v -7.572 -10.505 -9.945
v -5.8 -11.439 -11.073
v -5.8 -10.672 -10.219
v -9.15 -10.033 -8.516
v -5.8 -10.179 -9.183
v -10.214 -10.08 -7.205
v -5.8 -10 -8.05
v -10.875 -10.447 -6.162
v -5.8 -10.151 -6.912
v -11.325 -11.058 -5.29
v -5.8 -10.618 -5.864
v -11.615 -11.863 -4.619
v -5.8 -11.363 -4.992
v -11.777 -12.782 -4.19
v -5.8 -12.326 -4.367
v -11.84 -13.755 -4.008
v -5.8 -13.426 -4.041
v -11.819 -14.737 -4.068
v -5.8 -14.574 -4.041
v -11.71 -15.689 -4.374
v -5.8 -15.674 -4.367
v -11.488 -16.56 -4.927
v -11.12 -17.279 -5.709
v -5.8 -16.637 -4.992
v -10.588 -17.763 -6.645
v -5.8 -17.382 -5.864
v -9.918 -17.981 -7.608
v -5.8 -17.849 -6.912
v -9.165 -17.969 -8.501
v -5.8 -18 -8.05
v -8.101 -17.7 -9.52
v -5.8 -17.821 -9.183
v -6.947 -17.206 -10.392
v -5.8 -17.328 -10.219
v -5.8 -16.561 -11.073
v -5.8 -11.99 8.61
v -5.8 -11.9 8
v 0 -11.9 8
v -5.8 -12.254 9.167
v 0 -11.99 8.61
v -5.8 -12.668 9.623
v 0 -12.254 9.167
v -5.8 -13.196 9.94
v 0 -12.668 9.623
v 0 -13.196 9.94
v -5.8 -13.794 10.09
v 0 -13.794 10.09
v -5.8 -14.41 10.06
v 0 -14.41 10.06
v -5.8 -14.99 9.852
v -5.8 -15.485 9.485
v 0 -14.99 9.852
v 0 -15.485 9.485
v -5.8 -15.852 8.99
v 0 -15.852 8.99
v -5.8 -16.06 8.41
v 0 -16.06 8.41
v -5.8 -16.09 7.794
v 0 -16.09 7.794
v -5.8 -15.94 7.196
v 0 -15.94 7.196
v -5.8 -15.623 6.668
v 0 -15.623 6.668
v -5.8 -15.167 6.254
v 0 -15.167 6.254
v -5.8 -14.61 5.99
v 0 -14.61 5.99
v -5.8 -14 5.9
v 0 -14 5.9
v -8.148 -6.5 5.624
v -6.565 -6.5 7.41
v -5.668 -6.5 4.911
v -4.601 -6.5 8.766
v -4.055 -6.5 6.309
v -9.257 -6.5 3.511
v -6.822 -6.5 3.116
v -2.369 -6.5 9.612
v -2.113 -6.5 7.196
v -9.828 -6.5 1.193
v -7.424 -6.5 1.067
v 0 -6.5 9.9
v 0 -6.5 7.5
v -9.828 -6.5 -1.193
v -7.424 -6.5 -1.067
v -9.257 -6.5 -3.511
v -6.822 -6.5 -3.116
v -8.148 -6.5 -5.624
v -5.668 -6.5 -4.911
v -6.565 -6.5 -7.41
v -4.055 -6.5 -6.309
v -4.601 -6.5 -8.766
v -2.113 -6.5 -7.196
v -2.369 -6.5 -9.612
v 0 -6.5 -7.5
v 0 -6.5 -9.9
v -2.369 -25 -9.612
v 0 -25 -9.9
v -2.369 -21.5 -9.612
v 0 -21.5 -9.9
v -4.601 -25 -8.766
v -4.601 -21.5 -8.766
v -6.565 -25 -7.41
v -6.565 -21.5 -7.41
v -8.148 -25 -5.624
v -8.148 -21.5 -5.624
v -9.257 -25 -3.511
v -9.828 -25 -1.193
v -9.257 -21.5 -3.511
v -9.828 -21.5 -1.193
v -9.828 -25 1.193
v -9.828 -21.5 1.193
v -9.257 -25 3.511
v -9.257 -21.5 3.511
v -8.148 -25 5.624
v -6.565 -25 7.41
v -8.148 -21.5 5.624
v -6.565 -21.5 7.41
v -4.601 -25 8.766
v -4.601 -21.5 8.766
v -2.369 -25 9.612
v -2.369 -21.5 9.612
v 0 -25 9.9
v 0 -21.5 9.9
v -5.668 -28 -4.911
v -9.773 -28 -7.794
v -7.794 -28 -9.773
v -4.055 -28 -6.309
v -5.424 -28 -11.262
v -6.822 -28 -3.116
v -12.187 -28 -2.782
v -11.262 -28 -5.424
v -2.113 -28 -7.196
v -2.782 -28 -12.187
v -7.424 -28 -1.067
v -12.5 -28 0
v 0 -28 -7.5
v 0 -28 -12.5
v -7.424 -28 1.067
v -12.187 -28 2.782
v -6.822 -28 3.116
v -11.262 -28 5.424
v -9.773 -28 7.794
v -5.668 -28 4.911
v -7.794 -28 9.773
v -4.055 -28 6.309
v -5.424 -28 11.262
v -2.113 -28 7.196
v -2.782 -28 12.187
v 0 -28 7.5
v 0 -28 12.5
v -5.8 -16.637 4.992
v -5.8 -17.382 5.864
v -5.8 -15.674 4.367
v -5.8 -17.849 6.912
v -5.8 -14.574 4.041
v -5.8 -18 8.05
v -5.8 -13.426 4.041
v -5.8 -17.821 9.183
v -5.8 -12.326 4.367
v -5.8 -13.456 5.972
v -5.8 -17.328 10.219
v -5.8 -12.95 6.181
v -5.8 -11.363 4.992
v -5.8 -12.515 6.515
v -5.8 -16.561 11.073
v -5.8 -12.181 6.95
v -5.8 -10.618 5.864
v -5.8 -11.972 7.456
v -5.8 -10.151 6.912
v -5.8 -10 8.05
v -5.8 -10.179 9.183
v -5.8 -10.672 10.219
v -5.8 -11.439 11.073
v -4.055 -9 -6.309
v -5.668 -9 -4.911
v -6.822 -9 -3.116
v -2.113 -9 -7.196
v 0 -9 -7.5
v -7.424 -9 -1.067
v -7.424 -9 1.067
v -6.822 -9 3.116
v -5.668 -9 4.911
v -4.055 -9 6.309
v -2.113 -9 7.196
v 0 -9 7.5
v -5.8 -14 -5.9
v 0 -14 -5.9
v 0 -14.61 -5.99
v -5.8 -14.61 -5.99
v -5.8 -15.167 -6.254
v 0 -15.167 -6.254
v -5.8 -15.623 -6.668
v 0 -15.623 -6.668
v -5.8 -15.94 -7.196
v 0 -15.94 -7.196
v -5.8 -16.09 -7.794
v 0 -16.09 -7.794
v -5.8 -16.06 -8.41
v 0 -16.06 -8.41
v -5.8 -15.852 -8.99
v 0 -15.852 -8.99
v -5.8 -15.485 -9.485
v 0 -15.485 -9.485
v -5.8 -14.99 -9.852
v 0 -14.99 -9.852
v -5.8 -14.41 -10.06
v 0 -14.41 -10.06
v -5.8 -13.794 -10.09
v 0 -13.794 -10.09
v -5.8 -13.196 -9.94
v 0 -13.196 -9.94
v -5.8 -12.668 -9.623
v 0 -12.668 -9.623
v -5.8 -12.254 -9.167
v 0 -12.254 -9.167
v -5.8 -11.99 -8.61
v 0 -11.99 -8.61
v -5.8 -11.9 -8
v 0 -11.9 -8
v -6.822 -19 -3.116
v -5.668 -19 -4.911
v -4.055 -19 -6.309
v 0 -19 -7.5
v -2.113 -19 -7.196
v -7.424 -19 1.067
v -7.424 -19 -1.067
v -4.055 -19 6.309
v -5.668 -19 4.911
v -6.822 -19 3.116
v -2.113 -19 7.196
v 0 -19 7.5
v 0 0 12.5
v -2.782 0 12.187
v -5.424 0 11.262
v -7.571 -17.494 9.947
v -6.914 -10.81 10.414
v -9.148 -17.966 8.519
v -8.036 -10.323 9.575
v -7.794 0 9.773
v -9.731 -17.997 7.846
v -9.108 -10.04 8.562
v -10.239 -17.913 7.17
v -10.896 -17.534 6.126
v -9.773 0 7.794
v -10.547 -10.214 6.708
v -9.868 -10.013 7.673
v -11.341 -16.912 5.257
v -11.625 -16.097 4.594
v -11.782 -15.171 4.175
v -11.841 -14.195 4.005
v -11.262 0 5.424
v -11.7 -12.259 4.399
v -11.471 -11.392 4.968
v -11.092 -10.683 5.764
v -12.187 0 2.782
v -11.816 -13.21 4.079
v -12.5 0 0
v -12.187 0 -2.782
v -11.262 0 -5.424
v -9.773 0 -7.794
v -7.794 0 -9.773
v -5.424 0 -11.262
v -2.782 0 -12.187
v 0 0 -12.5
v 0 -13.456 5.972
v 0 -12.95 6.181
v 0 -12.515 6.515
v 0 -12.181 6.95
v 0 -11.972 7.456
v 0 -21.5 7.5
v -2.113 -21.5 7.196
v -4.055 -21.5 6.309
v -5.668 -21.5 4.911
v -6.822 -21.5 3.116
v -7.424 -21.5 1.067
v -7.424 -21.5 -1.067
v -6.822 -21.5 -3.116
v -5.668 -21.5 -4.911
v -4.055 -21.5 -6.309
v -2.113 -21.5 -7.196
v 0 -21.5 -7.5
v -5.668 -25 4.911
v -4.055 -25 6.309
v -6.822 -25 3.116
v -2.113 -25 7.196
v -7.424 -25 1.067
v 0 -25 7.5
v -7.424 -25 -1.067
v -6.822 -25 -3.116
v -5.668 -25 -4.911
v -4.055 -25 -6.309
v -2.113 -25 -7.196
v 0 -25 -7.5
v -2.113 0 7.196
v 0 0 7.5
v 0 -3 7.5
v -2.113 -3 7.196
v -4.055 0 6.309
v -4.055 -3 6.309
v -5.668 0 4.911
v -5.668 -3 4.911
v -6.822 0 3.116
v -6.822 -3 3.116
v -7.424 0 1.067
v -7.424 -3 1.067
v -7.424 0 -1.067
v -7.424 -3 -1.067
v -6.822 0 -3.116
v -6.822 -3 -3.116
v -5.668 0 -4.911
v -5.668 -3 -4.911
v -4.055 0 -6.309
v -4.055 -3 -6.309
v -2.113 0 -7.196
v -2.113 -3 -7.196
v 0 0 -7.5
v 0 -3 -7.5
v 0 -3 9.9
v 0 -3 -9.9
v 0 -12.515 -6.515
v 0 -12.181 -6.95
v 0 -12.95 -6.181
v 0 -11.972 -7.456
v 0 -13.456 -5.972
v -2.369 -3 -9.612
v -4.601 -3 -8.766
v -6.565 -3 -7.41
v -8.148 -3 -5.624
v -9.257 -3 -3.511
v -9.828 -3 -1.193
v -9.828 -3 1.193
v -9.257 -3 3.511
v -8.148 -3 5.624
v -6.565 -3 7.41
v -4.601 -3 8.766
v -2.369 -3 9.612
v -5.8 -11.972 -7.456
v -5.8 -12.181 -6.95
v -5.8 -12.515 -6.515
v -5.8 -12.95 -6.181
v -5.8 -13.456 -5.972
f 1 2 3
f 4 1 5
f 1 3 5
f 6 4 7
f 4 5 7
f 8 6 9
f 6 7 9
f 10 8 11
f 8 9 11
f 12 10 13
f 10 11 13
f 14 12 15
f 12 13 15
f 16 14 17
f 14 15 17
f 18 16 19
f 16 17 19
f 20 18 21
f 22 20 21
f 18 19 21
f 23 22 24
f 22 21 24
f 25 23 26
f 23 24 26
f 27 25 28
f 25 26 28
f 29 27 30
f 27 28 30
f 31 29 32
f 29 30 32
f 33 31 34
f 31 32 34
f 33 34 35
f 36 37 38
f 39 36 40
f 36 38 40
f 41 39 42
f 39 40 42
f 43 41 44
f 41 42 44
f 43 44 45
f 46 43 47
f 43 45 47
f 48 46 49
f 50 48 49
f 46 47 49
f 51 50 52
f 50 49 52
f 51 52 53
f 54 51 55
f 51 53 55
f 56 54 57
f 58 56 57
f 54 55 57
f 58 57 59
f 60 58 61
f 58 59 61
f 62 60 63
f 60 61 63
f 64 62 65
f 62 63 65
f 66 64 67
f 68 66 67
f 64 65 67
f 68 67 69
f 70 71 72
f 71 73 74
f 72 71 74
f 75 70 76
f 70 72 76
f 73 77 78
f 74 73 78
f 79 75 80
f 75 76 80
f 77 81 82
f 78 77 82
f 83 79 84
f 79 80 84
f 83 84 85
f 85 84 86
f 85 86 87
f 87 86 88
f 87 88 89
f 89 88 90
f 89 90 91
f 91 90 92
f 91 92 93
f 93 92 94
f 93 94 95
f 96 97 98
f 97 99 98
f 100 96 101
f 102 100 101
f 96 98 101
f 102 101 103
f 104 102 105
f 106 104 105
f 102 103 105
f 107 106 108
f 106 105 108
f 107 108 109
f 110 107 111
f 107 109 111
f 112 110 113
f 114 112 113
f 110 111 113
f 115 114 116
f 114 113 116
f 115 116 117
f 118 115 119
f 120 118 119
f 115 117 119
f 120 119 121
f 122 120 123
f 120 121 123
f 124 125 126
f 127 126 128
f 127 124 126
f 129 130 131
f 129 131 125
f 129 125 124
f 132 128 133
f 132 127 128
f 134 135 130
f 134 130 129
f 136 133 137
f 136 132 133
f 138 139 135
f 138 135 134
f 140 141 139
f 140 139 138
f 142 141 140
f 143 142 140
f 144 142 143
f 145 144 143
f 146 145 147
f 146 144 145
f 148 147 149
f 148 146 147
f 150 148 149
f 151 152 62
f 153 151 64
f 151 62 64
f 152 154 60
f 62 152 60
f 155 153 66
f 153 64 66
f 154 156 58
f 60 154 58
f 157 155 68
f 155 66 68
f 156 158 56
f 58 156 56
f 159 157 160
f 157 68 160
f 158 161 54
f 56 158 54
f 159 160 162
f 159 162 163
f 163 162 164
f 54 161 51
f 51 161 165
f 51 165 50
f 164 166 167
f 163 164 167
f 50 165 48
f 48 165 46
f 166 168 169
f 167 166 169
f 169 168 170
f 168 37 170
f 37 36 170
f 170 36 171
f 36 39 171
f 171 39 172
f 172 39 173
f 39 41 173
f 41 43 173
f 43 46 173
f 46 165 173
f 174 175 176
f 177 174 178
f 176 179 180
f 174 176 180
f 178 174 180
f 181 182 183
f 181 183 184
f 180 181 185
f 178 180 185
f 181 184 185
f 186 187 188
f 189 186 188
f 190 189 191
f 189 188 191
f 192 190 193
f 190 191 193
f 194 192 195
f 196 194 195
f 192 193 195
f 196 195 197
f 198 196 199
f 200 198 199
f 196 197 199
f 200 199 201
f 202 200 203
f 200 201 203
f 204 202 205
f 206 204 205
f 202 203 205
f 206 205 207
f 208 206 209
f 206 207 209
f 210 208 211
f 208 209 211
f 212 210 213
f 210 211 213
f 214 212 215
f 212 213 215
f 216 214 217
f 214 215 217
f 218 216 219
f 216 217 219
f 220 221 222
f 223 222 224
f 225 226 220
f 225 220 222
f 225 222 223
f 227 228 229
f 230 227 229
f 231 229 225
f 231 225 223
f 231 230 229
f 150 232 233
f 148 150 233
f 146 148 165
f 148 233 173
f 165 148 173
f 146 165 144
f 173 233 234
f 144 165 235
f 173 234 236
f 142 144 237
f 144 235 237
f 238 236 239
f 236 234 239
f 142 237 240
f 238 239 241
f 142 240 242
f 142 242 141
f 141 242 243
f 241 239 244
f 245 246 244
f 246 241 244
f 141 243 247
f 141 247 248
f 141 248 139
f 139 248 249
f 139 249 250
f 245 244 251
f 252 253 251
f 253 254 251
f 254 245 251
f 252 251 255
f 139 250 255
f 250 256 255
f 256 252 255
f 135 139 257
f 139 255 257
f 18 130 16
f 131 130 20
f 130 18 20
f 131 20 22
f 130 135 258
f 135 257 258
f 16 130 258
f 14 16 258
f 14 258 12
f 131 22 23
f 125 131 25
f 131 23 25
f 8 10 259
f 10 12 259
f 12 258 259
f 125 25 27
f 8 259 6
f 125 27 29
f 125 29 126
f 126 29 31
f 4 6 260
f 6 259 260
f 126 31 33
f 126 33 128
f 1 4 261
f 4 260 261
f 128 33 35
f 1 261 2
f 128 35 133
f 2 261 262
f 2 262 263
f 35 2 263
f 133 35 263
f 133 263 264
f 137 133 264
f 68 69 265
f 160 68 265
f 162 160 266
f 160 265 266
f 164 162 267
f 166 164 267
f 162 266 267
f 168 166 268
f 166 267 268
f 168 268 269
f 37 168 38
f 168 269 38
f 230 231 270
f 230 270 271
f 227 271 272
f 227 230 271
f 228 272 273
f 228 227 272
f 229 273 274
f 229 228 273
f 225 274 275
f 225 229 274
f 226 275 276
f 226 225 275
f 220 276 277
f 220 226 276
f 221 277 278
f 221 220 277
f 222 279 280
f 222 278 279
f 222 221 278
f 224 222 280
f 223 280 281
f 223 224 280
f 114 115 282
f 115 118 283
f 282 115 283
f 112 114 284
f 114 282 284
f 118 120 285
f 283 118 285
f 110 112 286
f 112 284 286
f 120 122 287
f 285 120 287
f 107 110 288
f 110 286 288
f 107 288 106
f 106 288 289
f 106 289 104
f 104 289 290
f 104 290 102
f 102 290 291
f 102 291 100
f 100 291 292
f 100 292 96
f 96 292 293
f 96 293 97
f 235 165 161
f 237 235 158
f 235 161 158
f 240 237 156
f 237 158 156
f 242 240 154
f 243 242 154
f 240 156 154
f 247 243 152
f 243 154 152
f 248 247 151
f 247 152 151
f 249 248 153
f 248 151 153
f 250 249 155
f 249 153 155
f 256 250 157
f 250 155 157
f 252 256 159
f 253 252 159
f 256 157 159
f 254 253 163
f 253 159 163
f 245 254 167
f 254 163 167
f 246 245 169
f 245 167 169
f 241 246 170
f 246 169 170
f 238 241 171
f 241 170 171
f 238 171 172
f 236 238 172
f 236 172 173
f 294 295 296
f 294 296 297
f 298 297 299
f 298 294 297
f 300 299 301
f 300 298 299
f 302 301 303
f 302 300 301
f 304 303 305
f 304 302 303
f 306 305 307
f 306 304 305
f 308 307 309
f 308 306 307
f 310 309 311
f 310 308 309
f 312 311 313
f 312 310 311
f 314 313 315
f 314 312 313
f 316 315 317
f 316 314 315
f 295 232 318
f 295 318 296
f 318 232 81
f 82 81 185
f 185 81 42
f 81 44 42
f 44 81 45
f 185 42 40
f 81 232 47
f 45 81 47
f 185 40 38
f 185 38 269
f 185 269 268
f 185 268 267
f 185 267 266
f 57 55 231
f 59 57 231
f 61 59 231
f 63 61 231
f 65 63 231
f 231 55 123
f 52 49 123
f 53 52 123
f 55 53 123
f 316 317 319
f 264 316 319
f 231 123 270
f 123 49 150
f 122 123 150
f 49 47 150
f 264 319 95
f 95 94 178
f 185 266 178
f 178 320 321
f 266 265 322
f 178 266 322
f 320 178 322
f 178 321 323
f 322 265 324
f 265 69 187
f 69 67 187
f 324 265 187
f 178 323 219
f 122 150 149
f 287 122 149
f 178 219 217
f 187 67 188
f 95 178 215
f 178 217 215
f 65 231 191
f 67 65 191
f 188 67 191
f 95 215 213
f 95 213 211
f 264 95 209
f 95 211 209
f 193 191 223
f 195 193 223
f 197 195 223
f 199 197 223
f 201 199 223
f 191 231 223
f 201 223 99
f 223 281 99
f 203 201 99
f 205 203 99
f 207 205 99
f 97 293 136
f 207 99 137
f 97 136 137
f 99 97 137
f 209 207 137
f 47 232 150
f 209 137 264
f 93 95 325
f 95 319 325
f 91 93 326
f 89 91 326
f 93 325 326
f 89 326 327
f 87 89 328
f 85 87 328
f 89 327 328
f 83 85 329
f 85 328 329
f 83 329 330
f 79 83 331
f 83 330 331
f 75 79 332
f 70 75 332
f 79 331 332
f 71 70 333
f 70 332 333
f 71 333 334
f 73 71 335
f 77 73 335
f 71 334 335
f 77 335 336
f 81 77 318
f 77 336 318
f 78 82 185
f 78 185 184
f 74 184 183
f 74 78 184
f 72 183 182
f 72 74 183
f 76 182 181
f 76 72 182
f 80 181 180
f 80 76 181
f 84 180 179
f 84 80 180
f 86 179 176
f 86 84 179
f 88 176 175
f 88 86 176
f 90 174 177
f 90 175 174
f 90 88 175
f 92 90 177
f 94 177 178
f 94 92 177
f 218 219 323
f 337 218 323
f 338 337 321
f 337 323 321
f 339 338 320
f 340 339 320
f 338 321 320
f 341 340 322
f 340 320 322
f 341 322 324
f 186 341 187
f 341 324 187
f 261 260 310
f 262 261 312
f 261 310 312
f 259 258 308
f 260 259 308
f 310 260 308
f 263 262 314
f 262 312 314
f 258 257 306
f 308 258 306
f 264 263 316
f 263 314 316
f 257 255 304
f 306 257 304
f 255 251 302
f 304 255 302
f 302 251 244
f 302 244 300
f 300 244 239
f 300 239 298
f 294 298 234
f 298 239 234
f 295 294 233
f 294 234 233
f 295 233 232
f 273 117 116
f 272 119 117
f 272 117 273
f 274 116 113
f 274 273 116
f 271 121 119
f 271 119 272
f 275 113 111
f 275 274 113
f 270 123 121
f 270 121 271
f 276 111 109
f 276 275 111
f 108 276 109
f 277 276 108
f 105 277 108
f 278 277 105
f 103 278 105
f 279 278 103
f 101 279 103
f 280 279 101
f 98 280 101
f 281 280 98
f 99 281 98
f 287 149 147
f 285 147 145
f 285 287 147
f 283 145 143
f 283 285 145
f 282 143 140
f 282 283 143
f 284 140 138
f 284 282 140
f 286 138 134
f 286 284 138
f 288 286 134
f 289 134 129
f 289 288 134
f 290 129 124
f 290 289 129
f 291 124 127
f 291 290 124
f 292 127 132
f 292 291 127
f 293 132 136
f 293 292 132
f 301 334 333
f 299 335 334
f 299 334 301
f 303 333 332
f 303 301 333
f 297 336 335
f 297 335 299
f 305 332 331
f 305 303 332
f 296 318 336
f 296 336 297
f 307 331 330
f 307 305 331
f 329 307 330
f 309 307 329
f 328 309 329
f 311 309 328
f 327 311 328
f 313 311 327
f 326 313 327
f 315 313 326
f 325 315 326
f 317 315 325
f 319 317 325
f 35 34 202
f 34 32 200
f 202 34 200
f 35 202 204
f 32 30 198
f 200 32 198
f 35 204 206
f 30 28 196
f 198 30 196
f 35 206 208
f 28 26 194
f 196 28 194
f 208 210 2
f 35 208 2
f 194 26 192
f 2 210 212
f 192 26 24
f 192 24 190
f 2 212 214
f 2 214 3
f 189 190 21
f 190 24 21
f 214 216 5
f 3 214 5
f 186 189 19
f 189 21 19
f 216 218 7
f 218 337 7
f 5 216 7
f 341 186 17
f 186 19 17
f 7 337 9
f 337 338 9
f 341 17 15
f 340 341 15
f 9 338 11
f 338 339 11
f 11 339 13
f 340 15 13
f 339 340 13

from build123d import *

# Parameters (mm, degrees)
F0_R      = 12.5
F0_R_2    = 7.5
F1_DEPTH  = 28
F2_W      = 3.5
F2_H      = 7.3783658981
F5_R      = 8.5
F6_DEPTH  = 5
F9_DEPTH  = 30
F10_DEPTH = 25
F12_START = -5.8
F11_R     = 4
F12_DEPTH = 19.2


with BuildPart() as f1:
    # F0 (on Front) → F1 (new body)
    with BuildSketch(Plane.XZ):
        Circle(F0_R)
        Circle(F0_R_2, mode=Mode.SUBTRACT)
    extrude(amount=F1_DEPTH)

    # F2 (on Right) → F3 (revolve, cut)
    with BuildSketch(Plane.YZ):
        with Locations((-23.25, 6.2108170509)):
            Rectangle(F2_W, F2_H)
        with Locations((-4.75, 6.2108170509)):
            Rectangle(F2_W, F2_H)
    revolve(axis=Axis((0, -29.1106614321, 0), (0, 1, 0)), mode=Mode.SUBTRACT)

    # F5 (on mid) → F6 (join, symmetric)
    with BuildSketch(Plane.XZ.offset(14)):
        Circle(F5_R)
    extrude(amount=F6_DEPTH, both=True)

    # F8 (on face) → F9 (cut)
    with BuildSketch(Plane.XZ.offset(28)):
        with BuildLine():
            Line((0, 12.5), (0, 7.5))
            ThreePointArc((0, 7.5), (5.3033008589, 5.3033008589), (7.5, 0))
            ThreePointArc((7.5, 0), (5.3033008589, -5.3033008589), (0, -7.5))
            Line((0, -7.5), (0, -12.5))
            ThreePointArc((0, -12.5), (8.8388347648, -8.8388347648), (12.5, 0))
            ThreePointArc((12.5, 0), (8.8388347648, 8.8388347648), (0, 12.5))
        make_face()
        with BuildLine():
            Line((0, 7.5), (0, -2.1648029558))
            Line((0, -2.1648029558), (0, -7.5))
            ThreePointArc((0, -7.5), (5.3033008589, -5.3033008589), (7.5, 0))
            ThreePointArc((7.5, 0), (5.3033008589, 5.3033008589), (0, 7.5))
        make_face()
    extrude(amount=-F9_DEPTH, mode=Mode.SUBTRACT)

    # F7 (on Right) → F10 (cut)
    with BuildSketch(Plane.YZ):
        with BuildLine():
            ThreePointArc((-11.9, -8), (-12.5150757595, -6.5150757595), (-14, -5.9))
            ThreePointArc((-14, -5.9), (-15.4849242405, -9.4849242405), (-11.9, -8))
        make_face()
        with BuildLine():
            ThreePointArc((-11.9, 8), (-15.4849242405, 9.4849242405), (-14, 5.9))
            ThreePointArc((-14, 5.9), (-12.5150757595, 6.5150757595), (-11.9, 8))
        make_face()
    extrude(amount=-F10_DEPTH, mode=Mode.SUBTRACT)

    # F11 (on Right) → F12 (cut)
    with BuildSketch(Plane.YZ.offset(F12_START)):
        with Locations((-14, -8)):
            Circle(F11_R)
        with Locations((-14, 8)):
            Circle(F11_R)
    extrude(amount=-F12_DEPTH, mode=Mode.SUBTRACT)


solid = f1.part
